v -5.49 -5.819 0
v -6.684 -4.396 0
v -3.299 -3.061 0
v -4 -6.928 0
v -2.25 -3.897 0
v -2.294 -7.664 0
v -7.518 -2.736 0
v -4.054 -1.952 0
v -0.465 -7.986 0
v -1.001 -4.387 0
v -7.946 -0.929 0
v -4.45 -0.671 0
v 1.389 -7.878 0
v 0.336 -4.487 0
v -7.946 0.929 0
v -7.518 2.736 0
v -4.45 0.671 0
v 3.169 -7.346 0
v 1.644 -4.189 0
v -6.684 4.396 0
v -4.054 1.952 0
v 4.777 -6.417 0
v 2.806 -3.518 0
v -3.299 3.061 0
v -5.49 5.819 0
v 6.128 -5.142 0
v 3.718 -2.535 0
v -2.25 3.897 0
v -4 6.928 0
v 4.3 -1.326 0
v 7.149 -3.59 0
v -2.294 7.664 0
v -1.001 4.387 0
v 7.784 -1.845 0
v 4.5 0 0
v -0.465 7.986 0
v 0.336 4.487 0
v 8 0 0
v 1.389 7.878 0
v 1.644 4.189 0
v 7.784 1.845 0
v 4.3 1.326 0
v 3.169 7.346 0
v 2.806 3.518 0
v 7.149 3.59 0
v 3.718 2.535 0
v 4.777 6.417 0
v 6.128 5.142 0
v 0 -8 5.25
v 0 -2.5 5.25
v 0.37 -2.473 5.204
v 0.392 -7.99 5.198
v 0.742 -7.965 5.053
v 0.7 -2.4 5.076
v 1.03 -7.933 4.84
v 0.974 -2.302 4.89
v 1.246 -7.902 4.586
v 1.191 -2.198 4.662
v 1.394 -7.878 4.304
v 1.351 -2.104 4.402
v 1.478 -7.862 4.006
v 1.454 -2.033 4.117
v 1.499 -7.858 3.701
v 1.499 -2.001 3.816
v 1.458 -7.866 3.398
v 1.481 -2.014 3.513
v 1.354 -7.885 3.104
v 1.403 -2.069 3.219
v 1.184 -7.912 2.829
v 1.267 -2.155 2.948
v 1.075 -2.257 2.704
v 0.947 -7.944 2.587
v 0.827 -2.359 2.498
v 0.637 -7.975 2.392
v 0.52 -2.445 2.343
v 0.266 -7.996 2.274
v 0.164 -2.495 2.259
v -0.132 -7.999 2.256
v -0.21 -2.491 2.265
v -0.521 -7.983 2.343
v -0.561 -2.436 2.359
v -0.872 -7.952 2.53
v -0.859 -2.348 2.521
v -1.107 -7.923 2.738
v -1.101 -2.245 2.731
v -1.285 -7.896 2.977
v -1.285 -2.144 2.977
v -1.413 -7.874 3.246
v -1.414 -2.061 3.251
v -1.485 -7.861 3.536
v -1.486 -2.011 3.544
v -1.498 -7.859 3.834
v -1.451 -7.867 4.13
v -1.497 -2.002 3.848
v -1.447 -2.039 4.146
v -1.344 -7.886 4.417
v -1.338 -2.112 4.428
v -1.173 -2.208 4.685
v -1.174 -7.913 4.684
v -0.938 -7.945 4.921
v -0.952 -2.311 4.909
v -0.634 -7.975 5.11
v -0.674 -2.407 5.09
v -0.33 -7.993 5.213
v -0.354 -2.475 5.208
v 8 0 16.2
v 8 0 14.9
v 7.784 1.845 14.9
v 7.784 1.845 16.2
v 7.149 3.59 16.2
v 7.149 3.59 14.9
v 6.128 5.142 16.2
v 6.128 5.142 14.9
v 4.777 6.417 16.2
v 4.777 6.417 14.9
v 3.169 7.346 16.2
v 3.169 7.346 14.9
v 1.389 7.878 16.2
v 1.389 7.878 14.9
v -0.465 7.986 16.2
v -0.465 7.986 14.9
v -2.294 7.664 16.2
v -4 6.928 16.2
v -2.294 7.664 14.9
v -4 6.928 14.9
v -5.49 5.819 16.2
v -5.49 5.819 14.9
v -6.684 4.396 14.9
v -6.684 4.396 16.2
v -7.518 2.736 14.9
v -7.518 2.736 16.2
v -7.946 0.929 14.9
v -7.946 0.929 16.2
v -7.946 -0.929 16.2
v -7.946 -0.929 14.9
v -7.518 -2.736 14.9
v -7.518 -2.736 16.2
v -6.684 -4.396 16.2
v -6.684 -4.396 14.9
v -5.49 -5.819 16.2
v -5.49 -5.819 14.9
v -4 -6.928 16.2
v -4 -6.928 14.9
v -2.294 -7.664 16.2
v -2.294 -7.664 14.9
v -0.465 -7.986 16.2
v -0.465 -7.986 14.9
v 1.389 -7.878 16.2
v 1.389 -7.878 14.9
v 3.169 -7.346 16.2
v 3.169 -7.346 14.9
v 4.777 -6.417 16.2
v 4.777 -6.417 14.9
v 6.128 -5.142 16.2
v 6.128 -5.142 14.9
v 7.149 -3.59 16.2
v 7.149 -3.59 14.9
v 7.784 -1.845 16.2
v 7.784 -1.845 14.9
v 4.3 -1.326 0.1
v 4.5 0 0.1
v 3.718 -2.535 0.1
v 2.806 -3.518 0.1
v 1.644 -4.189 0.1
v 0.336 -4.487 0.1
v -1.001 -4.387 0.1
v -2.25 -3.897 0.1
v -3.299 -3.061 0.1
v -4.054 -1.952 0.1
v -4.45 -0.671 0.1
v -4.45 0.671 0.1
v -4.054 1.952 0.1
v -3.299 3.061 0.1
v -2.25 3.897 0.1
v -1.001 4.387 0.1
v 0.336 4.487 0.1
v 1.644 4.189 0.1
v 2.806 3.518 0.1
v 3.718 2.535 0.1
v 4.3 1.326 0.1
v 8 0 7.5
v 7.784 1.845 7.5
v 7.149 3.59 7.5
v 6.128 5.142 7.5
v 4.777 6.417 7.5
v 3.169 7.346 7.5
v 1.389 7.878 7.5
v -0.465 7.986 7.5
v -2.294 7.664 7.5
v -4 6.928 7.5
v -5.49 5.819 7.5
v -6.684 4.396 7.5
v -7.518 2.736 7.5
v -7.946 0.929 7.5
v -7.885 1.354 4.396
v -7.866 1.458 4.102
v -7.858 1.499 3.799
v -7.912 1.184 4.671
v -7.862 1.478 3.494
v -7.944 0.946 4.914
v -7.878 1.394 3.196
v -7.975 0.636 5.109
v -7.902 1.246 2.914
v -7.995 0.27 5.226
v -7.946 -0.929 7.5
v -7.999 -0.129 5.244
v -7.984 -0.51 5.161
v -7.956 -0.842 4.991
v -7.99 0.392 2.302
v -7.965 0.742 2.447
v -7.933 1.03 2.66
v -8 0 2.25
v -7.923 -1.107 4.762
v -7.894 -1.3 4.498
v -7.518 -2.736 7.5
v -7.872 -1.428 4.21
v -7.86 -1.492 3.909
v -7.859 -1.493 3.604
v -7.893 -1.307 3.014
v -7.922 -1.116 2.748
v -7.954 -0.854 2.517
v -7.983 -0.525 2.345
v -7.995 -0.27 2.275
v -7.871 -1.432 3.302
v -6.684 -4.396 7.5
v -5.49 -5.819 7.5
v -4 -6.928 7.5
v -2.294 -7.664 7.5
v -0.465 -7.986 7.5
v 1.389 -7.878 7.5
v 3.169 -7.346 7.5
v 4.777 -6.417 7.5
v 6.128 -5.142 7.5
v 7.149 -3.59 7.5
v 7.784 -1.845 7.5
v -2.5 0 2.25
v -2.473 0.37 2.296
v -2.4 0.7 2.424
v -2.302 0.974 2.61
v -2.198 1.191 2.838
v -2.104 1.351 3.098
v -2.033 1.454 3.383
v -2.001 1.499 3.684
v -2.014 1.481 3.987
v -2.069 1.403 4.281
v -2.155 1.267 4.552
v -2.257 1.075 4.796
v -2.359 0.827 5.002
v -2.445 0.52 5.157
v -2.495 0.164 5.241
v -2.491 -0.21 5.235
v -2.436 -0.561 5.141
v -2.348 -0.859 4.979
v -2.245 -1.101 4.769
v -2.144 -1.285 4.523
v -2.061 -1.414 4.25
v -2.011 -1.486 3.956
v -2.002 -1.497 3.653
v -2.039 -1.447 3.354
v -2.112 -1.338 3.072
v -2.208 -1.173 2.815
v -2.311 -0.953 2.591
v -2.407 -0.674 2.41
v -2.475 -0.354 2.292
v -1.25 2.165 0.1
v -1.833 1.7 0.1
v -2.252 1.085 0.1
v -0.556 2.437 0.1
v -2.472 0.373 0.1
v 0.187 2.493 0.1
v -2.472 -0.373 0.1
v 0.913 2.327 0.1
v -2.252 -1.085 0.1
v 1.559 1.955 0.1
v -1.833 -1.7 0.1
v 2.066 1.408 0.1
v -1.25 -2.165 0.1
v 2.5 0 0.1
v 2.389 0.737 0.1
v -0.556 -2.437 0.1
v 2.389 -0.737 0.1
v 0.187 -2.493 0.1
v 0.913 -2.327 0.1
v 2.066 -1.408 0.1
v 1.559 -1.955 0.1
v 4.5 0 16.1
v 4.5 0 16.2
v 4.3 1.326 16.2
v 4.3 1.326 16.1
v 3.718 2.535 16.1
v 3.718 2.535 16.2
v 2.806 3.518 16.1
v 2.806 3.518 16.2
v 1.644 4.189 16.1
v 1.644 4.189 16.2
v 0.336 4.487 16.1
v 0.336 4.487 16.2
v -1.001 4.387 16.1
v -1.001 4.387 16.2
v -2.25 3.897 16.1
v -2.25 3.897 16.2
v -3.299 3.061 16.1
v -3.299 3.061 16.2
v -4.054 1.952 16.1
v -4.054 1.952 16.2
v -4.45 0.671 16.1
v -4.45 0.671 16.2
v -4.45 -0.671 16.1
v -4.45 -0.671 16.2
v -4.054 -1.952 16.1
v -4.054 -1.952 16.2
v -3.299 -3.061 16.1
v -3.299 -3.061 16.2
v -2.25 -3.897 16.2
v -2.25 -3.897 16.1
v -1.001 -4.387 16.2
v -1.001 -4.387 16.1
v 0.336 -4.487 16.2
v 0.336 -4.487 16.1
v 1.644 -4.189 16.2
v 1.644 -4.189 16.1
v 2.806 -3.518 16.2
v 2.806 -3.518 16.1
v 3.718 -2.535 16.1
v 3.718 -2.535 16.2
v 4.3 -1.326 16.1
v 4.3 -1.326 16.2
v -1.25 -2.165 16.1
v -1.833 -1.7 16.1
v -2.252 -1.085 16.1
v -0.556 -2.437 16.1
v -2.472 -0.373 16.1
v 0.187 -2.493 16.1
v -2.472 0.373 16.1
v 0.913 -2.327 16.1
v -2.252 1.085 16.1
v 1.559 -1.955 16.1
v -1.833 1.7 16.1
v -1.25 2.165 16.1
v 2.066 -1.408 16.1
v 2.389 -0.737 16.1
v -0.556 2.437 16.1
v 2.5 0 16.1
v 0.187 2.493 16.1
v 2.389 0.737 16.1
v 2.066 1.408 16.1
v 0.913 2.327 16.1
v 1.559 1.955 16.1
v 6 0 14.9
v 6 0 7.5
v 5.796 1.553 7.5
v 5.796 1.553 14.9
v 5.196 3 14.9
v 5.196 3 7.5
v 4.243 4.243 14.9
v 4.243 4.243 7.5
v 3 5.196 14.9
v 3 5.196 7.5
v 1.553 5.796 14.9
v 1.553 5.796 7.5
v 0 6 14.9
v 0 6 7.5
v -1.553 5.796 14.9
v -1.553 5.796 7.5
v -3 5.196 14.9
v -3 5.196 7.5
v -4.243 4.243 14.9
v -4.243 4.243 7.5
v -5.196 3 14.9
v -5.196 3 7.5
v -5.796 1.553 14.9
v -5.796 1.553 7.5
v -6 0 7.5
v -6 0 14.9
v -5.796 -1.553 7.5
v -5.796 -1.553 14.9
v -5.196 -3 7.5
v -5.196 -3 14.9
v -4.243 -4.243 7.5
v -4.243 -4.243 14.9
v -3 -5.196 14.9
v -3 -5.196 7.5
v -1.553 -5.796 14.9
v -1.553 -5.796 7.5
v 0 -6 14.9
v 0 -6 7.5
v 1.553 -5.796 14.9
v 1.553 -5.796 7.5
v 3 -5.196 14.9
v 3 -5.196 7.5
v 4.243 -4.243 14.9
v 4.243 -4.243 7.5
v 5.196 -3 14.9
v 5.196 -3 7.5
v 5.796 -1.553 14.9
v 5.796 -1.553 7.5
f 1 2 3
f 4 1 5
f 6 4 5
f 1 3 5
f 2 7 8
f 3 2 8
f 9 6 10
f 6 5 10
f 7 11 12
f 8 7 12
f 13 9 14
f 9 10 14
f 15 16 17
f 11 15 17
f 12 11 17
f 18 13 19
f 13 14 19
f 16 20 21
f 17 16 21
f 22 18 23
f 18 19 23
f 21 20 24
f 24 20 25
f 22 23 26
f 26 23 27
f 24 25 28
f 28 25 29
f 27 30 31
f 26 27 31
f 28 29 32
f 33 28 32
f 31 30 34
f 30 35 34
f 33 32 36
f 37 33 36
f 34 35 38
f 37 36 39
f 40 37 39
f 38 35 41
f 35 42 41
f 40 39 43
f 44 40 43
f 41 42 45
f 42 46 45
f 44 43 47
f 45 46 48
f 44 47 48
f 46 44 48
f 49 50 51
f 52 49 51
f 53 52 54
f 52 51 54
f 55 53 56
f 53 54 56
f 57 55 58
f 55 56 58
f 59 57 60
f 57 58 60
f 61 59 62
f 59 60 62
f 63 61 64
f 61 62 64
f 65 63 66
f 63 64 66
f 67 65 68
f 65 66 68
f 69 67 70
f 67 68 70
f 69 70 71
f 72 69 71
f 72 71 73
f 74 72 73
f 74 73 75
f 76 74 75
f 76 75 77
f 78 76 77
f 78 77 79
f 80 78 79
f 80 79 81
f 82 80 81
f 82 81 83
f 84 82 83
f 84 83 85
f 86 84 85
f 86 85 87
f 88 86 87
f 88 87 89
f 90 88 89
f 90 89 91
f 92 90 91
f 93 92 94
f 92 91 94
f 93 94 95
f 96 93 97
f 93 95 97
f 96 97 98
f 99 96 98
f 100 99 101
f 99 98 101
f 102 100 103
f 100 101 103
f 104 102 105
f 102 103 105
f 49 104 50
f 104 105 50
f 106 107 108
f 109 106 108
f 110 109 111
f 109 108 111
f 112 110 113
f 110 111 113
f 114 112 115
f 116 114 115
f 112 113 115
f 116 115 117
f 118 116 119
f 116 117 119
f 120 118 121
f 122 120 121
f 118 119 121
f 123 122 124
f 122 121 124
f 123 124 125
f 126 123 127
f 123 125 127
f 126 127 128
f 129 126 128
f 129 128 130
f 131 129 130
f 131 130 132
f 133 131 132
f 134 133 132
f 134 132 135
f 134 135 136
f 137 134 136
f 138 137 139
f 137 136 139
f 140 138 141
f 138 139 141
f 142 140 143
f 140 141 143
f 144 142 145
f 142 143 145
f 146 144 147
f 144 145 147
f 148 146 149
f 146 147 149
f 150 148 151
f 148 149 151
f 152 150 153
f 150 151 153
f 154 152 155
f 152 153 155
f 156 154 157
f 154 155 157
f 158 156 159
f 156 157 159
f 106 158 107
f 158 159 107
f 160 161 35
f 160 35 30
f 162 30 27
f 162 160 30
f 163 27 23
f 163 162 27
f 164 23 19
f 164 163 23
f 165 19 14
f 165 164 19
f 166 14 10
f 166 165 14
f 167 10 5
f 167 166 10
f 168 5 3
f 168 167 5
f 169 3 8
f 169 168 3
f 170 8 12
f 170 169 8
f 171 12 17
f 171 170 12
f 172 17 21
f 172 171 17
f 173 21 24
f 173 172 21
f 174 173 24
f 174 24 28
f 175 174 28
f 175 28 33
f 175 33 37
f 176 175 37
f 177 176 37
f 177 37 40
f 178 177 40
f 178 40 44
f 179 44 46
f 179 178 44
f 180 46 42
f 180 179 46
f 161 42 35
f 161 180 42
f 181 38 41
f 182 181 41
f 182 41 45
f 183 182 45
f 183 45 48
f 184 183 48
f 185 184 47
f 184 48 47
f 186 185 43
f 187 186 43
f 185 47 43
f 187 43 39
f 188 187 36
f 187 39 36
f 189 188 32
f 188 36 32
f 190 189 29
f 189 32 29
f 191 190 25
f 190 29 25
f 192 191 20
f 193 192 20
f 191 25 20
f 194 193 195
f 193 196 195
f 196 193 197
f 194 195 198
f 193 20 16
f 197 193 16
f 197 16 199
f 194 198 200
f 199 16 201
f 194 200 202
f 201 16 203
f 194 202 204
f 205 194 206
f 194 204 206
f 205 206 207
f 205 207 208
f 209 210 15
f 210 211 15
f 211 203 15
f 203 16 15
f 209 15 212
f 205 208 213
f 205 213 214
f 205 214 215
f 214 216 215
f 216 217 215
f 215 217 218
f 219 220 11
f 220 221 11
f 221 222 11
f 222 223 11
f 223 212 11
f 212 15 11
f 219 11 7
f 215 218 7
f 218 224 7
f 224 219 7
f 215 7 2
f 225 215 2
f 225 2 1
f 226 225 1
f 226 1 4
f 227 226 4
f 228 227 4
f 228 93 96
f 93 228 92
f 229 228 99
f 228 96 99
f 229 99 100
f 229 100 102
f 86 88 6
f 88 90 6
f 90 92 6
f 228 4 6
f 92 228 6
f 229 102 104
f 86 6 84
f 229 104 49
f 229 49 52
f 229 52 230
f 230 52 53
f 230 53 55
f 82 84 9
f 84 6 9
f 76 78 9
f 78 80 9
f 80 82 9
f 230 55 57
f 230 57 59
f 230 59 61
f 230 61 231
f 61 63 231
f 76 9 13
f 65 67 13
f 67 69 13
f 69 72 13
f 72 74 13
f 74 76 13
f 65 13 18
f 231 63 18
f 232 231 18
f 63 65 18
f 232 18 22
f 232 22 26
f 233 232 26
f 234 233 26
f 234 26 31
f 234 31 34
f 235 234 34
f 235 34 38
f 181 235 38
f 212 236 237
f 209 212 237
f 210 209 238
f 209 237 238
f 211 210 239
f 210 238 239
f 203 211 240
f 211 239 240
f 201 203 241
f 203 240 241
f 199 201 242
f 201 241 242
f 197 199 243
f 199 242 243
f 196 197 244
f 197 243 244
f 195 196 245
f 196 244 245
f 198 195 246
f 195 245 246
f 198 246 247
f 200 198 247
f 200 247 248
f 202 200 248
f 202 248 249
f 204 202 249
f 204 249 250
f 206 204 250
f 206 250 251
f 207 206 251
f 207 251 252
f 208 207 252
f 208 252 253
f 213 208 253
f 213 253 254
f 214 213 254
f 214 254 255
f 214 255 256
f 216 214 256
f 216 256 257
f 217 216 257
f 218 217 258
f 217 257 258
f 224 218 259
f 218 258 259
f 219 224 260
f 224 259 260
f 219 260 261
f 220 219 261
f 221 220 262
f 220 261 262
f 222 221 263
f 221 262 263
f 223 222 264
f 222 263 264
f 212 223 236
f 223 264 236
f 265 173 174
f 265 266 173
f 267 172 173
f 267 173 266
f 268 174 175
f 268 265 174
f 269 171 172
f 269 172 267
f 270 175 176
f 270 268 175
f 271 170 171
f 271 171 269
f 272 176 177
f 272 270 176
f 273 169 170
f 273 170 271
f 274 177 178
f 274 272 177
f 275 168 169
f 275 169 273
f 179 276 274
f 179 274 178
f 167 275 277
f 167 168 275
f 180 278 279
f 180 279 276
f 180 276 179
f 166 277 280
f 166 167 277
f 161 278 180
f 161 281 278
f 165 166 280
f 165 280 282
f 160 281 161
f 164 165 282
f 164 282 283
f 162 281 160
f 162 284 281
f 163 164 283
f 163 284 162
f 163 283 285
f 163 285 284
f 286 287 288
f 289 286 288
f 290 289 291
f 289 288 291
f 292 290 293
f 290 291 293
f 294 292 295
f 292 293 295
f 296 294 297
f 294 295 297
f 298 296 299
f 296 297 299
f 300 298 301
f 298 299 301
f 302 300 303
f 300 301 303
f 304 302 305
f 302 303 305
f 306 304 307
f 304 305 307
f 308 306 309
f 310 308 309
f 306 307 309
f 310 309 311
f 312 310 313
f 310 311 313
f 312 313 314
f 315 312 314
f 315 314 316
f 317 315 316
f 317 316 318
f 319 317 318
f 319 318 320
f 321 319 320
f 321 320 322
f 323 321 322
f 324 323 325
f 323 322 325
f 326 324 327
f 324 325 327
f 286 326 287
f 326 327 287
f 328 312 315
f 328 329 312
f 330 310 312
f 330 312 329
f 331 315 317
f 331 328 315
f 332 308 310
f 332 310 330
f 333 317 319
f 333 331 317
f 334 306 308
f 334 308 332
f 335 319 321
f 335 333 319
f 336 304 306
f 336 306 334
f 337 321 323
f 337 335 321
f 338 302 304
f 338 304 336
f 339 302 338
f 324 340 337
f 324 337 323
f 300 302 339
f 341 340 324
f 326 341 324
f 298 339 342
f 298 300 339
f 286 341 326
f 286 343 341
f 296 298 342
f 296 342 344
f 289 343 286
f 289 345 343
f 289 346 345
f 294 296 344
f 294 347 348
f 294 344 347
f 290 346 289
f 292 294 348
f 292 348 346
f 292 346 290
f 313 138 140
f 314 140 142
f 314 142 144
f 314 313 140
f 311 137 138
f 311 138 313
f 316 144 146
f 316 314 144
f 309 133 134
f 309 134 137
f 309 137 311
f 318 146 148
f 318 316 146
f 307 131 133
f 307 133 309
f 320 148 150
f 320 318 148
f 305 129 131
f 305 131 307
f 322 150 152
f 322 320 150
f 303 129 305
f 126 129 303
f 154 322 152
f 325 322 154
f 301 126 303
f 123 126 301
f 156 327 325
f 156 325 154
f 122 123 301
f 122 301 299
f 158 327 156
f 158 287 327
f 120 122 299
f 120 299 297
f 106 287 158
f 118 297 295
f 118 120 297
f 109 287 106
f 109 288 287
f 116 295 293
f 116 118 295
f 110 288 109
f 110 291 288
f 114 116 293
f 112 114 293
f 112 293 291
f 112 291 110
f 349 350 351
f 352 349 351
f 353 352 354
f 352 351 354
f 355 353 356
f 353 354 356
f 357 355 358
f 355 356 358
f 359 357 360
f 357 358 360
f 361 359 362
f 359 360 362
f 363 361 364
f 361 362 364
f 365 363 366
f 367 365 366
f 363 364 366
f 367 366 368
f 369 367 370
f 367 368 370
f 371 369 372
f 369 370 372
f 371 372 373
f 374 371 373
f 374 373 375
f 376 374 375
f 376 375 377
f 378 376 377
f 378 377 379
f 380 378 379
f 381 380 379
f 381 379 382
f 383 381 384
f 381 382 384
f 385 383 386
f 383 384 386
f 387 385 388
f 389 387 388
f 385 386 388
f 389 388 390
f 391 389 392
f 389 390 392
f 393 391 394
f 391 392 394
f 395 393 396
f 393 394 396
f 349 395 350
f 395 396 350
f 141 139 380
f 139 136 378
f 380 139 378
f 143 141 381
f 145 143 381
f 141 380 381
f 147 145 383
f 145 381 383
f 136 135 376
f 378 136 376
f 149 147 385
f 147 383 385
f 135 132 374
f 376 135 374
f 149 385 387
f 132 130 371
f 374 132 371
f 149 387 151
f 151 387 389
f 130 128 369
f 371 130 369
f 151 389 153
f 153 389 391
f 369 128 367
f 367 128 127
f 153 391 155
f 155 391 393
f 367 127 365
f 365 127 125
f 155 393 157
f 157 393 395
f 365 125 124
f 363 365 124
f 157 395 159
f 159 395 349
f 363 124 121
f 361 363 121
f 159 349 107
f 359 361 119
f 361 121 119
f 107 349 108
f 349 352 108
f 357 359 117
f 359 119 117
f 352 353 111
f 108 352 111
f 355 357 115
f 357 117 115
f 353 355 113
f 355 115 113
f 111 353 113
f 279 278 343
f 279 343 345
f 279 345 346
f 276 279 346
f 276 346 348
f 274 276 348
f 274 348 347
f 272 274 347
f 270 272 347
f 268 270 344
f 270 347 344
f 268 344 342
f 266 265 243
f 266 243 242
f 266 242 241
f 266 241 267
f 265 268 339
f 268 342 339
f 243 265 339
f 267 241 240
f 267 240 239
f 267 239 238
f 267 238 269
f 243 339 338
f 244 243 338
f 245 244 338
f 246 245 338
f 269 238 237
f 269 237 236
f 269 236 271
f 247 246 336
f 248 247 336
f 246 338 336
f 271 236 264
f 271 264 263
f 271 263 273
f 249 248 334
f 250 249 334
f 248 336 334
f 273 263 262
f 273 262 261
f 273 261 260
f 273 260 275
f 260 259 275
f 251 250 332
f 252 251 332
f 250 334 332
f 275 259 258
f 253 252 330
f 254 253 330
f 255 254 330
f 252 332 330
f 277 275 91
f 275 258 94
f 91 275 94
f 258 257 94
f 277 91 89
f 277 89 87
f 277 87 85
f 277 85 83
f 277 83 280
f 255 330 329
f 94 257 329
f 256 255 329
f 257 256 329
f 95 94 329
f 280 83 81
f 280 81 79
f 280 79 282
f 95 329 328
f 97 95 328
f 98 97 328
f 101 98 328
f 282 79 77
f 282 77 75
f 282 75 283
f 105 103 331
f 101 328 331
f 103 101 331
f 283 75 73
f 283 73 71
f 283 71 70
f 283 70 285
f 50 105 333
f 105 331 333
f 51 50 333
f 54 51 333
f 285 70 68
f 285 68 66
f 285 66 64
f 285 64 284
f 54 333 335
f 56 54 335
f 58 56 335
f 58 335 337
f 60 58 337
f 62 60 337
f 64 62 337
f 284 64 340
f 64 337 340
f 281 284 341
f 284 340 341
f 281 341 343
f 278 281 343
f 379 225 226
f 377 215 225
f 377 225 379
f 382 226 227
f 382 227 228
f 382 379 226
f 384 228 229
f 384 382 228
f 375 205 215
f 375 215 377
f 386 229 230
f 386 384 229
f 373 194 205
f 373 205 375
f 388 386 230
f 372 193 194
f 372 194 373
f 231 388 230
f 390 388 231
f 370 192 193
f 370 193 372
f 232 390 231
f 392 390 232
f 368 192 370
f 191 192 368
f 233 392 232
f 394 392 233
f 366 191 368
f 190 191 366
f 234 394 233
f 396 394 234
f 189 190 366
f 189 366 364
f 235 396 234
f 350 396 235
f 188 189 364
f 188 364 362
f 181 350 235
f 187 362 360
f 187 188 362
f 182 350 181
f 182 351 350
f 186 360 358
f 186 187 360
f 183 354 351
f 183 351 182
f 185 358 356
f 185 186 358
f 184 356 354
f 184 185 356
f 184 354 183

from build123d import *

# Parameters (mm, degrees)
SKETCH1_R           = 8
BOSS_EXTRUDE1_DEPTH = 7.5
SKETCH2_R           = 6
BOSS_EXTRUDE2_DEPTH = 7.4
SKETCH3_R           = 8
BOSS_EXTRUDE3_DEPTH = 1.3
SKETCH4_R           = 2.5
CUT_EXTRUDE1_DEPTH  = 20
SKETCH5_R           = 4.5
CUT_EXTRUDE2_DEPTH  = 0.1
CUT_EXTRUDE3_START  = -0.1
SKETCH6_R           = 4.5
CUT_EXTRUDE3_DEPTH  = 0.1
SKETCH7_R           = 1.5
CUT_EXTRUDE4_DEPTH  = 20
SKETCH8_R           = 1.5
CUT_EXTRUDE5_DEPTH  = 20


with BuildPart() as part:
    # Sketch1 → Boss-Extrude1 (new body)
    with BuildSketch(Plane.XY):
        Circle(SKETCH1_R)
    extrude(amount=BOSS_EXTRUDE1_DEPTH)

    # Sketch2 → Boss-Extrude2 (add)
    with BuildSketch(Plane.XY.offset(7.5)):
        Circle(SKETCH2_R)
    extrude(amount=BOSS_EXTRUDE2_DEPTH)

    # Sketch3 → Boss-Extrude3 (add)
    with BuildSketch(Plane.XY.offset(14.9)):
        Circle(SKETCH3_R)
    extrude(amount=BOSS_EXTRUDE3_DEPTH)

    # Sketch4 → Cut-Extrude1 (cut)
    with BuildSketch(Plane.XY.offset(16.2)):
        Circle(SKETCH4_R)
    extrude(amount=-CUT_EXTRUDE1_DEPTH, mode=Mode.SUBTRACT)

    # Sketch5 → Cut-Extrude2 (cut)
    with BuildSketch(Plane.XY.offset(16.2)):
        Circle(SKETCH5_R)
    extrude(amount=-CUT_EXTRUDE2_DEPTH, mode=Mode.SUBTRACT)

    # Sketch6 → Cut-Extrude3 (cut)
    with BuildSketch(Plane(origin=(0, 0, 0), x_dir=(-1, 0, 0), z_dir=(0, 0, -1)).offset(CUT_EXTRUDE3_START)):
        with Locations(Location((0, 0, 0), (0, 0, 180))):
            Circle(SKETCH6_R)
    extrude(amount=CUT_EXTRUDE3_DEPTH, mode=Mode.SUBTRACT)

    # Sketch7 → Cut-Extrude4 (cut)
    with BuildSketch(Plane(origin=(0, 0, 0), x_dir=(0, 0, -1), z_dir=(1, 0, 0))):
        with Locations((-3.75, 0)):
            Circle(SKETCH7_R)
    extrude(amount=-CUT_EXTRUDE4_DEPTH, mode=Mode.SUBTRACT)

    # Sketch8 → Cut-Extrude5 (cut)
    with BuildSketch(Plane(origin=(0, 0, 0), x_dir=(1, 0, 0), z_dir=(0, 1, 0))):
        with Locations(Location((0, -3.75, 0), (0, 0, 270))):
            Circle(SKETCH8_R)
    extrude(amount=-CUT_EXTRUDE5_DEPTH, mode=Mode.SUBTRACT)


solid = part.part
